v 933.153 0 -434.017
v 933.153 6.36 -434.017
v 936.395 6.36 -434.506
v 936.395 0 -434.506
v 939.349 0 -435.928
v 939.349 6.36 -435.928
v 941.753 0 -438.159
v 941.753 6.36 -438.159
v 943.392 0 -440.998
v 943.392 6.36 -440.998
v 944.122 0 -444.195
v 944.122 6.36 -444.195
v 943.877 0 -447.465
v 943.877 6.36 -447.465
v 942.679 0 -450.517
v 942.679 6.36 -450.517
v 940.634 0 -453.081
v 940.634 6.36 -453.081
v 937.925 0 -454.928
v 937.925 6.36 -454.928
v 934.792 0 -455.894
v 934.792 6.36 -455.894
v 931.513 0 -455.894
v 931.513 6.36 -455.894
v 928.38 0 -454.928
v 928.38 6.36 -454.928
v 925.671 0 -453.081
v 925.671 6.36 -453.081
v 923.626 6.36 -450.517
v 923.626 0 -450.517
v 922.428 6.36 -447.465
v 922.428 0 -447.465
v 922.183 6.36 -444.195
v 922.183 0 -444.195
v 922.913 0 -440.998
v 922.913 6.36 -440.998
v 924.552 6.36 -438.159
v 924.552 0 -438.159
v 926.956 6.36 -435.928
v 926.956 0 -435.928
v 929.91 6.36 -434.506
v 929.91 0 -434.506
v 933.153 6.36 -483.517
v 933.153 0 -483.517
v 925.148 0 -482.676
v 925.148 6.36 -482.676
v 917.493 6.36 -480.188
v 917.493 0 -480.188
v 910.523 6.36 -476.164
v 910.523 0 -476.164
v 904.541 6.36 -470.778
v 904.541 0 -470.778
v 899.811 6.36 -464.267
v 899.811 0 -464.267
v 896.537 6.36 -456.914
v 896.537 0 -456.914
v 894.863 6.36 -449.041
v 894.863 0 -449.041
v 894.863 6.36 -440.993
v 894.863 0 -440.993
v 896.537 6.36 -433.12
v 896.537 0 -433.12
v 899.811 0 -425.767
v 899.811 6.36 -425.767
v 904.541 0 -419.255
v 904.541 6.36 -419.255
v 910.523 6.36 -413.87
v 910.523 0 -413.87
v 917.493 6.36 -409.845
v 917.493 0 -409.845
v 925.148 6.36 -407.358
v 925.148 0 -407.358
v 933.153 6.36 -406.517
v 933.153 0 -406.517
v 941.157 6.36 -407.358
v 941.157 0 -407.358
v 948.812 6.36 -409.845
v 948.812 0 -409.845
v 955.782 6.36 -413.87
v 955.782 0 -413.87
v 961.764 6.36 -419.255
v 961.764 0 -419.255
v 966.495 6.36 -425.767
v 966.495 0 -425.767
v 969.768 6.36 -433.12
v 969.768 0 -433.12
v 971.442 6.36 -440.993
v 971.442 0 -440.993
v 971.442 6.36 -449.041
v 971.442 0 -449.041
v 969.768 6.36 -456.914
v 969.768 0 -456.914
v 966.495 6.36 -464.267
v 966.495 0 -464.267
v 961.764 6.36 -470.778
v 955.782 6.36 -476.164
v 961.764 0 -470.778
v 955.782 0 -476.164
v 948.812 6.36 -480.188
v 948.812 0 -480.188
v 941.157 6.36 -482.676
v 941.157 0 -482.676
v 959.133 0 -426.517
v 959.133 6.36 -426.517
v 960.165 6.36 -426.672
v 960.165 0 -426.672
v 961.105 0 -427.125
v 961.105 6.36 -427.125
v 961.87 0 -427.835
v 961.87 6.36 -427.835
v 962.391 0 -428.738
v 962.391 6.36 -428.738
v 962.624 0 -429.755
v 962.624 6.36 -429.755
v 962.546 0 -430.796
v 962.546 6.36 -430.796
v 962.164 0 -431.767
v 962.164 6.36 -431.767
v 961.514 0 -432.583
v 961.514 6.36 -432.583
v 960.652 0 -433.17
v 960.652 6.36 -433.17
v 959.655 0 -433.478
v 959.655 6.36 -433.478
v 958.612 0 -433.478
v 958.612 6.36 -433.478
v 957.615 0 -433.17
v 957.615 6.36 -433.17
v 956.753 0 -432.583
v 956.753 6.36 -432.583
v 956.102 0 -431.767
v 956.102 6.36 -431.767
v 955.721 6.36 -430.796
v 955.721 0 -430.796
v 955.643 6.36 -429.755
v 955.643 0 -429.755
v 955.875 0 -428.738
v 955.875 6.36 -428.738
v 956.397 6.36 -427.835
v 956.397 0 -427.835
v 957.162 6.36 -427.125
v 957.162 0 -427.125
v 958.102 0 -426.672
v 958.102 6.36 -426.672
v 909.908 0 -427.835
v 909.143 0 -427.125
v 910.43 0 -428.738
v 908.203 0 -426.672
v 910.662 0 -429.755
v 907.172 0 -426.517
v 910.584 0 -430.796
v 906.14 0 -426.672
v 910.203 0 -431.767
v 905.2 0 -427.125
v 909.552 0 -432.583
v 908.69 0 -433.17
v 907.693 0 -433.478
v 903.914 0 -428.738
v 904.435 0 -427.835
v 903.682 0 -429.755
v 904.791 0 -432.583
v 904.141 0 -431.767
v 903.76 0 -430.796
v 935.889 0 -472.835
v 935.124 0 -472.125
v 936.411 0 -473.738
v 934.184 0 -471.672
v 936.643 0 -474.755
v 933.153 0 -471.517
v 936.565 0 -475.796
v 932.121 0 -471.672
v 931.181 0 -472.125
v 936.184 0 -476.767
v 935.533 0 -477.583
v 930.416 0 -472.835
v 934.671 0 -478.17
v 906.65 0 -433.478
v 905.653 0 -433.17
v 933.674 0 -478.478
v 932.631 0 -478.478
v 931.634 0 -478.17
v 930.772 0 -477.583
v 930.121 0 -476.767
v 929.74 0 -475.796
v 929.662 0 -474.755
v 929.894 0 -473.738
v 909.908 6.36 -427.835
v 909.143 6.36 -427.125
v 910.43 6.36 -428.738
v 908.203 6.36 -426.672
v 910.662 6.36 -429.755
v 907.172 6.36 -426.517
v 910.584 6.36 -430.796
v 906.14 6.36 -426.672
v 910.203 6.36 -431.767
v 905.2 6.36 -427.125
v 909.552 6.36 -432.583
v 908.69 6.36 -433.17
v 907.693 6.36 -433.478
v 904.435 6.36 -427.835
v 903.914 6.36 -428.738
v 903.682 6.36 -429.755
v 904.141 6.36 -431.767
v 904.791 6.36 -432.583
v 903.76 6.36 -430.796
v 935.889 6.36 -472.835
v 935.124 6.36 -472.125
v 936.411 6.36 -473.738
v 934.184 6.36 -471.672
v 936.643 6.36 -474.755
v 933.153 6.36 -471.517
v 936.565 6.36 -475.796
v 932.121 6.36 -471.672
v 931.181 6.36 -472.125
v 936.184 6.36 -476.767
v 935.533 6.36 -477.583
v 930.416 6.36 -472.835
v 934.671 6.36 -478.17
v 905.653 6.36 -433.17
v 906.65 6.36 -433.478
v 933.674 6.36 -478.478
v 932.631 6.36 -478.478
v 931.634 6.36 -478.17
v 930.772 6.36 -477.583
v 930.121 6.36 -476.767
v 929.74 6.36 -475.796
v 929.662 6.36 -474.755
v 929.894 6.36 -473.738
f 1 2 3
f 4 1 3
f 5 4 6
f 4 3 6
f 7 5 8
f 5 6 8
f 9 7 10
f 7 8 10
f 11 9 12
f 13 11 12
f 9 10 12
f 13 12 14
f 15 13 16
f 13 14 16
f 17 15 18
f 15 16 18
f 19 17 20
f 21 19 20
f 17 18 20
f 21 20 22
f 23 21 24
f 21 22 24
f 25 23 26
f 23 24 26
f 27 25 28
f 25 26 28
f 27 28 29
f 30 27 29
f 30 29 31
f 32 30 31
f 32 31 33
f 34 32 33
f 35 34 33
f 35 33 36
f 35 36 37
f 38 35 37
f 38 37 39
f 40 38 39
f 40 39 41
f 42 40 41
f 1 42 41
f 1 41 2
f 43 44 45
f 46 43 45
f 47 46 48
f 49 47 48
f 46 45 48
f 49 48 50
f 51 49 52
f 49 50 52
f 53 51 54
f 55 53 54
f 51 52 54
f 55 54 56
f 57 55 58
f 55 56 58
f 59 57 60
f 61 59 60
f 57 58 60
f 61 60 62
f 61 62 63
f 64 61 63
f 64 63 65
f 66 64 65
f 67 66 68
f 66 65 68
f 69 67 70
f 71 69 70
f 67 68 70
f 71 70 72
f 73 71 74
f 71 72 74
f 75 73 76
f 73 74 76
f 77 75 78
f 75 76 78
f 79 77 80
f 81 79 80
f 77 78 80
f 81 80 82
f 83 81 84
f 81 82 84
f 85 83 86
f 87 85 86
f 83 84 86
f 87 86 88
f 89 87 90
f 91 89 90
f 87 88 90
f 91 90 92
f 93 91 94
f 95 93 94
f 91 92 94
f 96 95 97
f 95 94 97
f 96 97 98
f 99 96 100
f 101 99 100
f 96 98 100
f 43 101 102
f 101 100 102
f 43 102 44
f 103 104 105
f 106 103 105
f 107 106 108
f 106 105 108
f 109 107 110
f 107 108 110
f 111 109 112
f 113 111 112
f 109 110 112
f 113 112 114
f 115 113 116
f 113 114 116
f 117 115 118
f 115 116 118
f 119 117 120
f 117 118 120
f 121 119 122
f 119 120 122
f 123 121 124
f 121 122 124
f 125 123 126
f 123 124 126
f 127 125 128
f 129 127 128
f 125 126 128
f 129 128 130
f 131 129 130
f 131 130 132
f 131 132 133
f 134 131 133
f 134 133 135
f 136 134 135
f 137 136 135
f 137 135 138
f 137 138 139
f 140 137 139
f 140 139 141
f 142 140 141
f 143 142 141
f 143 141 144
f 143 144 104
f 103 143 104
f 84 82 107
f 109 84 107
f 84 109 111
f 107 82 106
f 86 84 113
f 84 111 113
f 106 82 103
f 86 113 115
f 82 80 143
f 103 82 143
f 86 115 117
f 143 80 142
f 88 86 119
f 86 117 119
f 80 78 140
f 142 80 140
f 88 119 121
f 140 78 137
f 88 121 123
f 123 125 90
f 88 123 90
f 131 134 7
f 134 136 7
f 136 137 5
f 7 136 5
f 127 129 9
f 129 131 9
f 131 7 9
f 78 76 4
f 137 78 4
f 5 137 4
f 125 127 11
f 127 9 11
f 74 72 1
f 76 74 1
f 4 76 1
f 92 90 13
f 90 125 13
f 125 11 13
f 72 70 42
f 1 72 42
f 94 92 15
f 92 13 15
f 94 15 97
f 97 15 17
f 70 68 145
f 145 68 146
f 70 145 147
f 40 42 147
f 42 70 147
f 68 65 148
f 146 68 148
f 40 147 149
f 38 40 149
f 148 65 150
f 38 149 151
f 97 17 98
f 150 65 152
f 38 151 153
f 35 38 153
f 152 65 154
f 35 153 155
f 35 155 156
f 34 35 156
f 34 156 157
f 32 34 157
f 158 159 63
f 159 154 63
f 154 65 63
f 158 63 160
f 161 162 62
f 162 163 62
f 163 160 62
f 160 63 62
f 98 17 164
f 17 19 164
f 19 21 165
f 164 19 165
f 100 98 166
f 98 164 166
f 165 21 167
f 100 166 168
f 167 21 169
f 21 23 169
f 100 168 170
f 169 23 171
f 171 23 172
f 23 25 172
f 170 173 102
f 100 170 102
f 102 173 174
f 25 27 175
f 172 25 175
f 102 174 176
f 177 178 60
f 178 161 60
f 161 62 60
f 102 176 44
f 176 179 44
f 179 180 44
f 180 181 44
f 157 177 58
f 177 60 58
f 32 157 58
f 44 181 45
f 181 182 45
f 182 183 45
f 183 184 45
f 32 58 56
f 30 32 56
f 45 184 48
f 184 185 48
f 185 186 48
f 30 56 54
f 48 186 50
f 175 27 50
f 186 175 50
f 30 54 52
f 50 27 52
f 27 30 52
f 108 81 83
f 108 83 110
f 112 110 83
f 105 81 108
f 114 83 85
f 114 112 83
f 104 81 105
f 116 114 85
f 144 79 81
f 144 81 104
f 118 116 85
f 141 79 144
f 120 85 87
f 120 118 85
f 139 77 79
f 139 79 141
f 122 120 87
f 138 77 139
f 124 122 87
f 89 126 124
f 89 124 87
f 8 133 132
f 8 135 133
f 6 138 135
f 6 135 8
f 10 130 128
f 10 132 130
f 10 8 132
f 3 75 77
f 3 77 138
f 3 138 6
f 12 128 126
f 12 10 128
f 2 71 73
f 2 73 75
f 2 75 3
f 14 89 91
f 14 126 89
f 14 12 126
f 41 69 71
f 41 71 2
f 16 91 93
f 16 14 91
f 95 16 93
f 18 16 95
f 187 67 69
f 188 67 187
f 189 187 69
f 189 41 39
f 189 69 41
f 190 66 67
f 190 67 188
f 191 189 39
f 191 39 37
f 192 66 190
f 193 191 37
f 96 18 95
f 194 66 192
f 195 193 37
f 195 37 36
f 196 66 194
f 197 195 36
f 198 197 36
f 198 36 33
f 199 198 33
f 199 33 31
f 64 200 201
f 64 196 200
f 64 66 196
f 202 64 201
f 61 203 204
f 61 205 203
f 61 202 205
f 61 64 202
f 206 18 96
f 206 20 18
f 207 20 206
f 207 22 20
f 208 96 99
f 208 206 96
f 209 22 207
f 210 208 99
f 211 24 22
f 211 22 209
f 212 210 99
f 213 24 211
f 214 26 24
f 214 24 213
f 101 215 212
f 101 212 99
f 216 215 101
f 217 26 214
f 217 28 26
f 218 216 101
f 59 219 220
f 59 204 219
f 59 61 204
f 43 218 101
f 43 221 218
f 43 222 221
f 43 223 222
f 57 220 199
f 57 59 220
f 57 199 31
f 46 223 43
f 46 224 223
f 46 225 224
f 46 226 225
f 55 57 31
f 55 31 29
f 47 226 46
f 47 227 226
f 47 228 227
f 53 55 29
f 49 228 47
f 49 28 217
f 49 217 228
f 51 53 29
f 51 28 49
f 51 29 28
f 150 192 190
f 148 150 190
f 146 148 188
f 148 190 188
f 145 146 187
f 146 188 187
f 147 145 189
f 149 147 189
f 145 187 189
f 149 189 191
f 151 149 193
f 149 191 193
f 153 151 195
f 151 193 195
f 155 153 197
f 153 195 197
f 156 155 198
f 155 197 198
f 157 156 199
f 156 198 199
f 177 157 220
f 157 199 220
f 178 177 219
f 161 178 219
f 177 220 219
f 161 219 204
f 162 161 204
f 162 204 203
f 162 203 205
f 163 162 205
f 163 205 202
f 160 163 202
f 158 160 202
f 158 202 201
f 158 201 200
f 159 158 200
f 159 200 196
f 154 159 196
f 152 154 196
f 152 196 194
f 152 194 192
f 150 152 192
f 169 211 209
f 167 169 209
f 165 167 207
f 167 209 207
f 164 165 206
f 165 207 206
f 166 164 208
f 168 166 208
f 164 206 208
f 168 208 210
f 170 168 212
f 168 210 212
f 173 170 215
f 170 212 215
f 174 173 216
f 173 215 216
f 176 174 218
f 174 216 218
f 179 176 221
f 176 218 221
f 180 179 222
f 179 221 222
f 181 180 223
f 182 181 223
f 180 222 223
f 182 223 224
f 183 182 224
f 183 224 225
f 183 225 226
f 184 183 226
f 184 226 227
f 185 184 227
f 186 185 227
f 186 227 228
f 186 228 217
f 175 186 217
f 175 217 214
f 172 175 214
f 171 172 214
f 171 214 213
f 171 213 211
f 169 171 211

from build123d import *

# Parameters (mm, degrees)
SKETCH5_R           = 38.5
BOSS_EXTRUDE2_DEPTH = 6.36
SKETCH7_R           = 3.5
CUT_EXTRUDE3_DEPTH  = 1086.328407818
SKETCH8_R           = 11
CUT_EXTRUDE4_DEPTH  = 1086.328407818


with BuildPart() as part:
    # Sketch5 → Boss-Extrude2 (new body)
    with BuildSketch(Plane(origin=(0, 0, 0), x_dir=(1, 0, 0), z_dir=(0, 1, 0))):
        with Locations(Location((933.152542373, 445.016949153, 0), (0, 0, 90))):
            Circle(SKETCH5_R)
    extrude(amount=BOSS_EXTRUDE2_DEPTH)

    # Sketch7 → Cut-Extrude3 (cut, through all)
    with BuildSketch(Plane(origin=(0, 6.36, 0), x_dir=(1, 0, 0), z_dir=(0, 1, 0))):
        with Locations(Location((933.152542373, 475.016949153, 0), (0, 0, 270))):
            Circle(SKETCH7_R)
        with Locations((-55.199525992, -1045.642281877)):
            Circle(SKETCH7_R)
        with Locations((-877.953016381, 570.625332725)):
            Circle(SKETCH7_R)
        with Locations(Location((959.133304486, 430.016949153, 0), (0, 0, 270))):
            Circle(SKETCH7_R)
        with Locations(Location((907.171780259, 430.016949153, 0), (0, 0, 270))):
            Circle(SKETCH7_R)
    extrude(amount=-CUT_EXTRUDE3_DEPTH, mode=Mode.SUBTRACT)

    # Sketch8 → Cut-Extrude4 (cut, through all)
    with BuildSketch(Plane(origin=(0, 6.36, 0), x_dir=(1, 0, 0), z_dir=(0, 1, 0))):
        with Locations(Location((933.152542373, 445.016949153, 0), (0, 0, 270))):
            Circle(SKETCH8_R)
    extrude(amount=-CUT_EXTRUDE4_DEPTH, mode=Mode.SUBTRACT)


solid = part.part
